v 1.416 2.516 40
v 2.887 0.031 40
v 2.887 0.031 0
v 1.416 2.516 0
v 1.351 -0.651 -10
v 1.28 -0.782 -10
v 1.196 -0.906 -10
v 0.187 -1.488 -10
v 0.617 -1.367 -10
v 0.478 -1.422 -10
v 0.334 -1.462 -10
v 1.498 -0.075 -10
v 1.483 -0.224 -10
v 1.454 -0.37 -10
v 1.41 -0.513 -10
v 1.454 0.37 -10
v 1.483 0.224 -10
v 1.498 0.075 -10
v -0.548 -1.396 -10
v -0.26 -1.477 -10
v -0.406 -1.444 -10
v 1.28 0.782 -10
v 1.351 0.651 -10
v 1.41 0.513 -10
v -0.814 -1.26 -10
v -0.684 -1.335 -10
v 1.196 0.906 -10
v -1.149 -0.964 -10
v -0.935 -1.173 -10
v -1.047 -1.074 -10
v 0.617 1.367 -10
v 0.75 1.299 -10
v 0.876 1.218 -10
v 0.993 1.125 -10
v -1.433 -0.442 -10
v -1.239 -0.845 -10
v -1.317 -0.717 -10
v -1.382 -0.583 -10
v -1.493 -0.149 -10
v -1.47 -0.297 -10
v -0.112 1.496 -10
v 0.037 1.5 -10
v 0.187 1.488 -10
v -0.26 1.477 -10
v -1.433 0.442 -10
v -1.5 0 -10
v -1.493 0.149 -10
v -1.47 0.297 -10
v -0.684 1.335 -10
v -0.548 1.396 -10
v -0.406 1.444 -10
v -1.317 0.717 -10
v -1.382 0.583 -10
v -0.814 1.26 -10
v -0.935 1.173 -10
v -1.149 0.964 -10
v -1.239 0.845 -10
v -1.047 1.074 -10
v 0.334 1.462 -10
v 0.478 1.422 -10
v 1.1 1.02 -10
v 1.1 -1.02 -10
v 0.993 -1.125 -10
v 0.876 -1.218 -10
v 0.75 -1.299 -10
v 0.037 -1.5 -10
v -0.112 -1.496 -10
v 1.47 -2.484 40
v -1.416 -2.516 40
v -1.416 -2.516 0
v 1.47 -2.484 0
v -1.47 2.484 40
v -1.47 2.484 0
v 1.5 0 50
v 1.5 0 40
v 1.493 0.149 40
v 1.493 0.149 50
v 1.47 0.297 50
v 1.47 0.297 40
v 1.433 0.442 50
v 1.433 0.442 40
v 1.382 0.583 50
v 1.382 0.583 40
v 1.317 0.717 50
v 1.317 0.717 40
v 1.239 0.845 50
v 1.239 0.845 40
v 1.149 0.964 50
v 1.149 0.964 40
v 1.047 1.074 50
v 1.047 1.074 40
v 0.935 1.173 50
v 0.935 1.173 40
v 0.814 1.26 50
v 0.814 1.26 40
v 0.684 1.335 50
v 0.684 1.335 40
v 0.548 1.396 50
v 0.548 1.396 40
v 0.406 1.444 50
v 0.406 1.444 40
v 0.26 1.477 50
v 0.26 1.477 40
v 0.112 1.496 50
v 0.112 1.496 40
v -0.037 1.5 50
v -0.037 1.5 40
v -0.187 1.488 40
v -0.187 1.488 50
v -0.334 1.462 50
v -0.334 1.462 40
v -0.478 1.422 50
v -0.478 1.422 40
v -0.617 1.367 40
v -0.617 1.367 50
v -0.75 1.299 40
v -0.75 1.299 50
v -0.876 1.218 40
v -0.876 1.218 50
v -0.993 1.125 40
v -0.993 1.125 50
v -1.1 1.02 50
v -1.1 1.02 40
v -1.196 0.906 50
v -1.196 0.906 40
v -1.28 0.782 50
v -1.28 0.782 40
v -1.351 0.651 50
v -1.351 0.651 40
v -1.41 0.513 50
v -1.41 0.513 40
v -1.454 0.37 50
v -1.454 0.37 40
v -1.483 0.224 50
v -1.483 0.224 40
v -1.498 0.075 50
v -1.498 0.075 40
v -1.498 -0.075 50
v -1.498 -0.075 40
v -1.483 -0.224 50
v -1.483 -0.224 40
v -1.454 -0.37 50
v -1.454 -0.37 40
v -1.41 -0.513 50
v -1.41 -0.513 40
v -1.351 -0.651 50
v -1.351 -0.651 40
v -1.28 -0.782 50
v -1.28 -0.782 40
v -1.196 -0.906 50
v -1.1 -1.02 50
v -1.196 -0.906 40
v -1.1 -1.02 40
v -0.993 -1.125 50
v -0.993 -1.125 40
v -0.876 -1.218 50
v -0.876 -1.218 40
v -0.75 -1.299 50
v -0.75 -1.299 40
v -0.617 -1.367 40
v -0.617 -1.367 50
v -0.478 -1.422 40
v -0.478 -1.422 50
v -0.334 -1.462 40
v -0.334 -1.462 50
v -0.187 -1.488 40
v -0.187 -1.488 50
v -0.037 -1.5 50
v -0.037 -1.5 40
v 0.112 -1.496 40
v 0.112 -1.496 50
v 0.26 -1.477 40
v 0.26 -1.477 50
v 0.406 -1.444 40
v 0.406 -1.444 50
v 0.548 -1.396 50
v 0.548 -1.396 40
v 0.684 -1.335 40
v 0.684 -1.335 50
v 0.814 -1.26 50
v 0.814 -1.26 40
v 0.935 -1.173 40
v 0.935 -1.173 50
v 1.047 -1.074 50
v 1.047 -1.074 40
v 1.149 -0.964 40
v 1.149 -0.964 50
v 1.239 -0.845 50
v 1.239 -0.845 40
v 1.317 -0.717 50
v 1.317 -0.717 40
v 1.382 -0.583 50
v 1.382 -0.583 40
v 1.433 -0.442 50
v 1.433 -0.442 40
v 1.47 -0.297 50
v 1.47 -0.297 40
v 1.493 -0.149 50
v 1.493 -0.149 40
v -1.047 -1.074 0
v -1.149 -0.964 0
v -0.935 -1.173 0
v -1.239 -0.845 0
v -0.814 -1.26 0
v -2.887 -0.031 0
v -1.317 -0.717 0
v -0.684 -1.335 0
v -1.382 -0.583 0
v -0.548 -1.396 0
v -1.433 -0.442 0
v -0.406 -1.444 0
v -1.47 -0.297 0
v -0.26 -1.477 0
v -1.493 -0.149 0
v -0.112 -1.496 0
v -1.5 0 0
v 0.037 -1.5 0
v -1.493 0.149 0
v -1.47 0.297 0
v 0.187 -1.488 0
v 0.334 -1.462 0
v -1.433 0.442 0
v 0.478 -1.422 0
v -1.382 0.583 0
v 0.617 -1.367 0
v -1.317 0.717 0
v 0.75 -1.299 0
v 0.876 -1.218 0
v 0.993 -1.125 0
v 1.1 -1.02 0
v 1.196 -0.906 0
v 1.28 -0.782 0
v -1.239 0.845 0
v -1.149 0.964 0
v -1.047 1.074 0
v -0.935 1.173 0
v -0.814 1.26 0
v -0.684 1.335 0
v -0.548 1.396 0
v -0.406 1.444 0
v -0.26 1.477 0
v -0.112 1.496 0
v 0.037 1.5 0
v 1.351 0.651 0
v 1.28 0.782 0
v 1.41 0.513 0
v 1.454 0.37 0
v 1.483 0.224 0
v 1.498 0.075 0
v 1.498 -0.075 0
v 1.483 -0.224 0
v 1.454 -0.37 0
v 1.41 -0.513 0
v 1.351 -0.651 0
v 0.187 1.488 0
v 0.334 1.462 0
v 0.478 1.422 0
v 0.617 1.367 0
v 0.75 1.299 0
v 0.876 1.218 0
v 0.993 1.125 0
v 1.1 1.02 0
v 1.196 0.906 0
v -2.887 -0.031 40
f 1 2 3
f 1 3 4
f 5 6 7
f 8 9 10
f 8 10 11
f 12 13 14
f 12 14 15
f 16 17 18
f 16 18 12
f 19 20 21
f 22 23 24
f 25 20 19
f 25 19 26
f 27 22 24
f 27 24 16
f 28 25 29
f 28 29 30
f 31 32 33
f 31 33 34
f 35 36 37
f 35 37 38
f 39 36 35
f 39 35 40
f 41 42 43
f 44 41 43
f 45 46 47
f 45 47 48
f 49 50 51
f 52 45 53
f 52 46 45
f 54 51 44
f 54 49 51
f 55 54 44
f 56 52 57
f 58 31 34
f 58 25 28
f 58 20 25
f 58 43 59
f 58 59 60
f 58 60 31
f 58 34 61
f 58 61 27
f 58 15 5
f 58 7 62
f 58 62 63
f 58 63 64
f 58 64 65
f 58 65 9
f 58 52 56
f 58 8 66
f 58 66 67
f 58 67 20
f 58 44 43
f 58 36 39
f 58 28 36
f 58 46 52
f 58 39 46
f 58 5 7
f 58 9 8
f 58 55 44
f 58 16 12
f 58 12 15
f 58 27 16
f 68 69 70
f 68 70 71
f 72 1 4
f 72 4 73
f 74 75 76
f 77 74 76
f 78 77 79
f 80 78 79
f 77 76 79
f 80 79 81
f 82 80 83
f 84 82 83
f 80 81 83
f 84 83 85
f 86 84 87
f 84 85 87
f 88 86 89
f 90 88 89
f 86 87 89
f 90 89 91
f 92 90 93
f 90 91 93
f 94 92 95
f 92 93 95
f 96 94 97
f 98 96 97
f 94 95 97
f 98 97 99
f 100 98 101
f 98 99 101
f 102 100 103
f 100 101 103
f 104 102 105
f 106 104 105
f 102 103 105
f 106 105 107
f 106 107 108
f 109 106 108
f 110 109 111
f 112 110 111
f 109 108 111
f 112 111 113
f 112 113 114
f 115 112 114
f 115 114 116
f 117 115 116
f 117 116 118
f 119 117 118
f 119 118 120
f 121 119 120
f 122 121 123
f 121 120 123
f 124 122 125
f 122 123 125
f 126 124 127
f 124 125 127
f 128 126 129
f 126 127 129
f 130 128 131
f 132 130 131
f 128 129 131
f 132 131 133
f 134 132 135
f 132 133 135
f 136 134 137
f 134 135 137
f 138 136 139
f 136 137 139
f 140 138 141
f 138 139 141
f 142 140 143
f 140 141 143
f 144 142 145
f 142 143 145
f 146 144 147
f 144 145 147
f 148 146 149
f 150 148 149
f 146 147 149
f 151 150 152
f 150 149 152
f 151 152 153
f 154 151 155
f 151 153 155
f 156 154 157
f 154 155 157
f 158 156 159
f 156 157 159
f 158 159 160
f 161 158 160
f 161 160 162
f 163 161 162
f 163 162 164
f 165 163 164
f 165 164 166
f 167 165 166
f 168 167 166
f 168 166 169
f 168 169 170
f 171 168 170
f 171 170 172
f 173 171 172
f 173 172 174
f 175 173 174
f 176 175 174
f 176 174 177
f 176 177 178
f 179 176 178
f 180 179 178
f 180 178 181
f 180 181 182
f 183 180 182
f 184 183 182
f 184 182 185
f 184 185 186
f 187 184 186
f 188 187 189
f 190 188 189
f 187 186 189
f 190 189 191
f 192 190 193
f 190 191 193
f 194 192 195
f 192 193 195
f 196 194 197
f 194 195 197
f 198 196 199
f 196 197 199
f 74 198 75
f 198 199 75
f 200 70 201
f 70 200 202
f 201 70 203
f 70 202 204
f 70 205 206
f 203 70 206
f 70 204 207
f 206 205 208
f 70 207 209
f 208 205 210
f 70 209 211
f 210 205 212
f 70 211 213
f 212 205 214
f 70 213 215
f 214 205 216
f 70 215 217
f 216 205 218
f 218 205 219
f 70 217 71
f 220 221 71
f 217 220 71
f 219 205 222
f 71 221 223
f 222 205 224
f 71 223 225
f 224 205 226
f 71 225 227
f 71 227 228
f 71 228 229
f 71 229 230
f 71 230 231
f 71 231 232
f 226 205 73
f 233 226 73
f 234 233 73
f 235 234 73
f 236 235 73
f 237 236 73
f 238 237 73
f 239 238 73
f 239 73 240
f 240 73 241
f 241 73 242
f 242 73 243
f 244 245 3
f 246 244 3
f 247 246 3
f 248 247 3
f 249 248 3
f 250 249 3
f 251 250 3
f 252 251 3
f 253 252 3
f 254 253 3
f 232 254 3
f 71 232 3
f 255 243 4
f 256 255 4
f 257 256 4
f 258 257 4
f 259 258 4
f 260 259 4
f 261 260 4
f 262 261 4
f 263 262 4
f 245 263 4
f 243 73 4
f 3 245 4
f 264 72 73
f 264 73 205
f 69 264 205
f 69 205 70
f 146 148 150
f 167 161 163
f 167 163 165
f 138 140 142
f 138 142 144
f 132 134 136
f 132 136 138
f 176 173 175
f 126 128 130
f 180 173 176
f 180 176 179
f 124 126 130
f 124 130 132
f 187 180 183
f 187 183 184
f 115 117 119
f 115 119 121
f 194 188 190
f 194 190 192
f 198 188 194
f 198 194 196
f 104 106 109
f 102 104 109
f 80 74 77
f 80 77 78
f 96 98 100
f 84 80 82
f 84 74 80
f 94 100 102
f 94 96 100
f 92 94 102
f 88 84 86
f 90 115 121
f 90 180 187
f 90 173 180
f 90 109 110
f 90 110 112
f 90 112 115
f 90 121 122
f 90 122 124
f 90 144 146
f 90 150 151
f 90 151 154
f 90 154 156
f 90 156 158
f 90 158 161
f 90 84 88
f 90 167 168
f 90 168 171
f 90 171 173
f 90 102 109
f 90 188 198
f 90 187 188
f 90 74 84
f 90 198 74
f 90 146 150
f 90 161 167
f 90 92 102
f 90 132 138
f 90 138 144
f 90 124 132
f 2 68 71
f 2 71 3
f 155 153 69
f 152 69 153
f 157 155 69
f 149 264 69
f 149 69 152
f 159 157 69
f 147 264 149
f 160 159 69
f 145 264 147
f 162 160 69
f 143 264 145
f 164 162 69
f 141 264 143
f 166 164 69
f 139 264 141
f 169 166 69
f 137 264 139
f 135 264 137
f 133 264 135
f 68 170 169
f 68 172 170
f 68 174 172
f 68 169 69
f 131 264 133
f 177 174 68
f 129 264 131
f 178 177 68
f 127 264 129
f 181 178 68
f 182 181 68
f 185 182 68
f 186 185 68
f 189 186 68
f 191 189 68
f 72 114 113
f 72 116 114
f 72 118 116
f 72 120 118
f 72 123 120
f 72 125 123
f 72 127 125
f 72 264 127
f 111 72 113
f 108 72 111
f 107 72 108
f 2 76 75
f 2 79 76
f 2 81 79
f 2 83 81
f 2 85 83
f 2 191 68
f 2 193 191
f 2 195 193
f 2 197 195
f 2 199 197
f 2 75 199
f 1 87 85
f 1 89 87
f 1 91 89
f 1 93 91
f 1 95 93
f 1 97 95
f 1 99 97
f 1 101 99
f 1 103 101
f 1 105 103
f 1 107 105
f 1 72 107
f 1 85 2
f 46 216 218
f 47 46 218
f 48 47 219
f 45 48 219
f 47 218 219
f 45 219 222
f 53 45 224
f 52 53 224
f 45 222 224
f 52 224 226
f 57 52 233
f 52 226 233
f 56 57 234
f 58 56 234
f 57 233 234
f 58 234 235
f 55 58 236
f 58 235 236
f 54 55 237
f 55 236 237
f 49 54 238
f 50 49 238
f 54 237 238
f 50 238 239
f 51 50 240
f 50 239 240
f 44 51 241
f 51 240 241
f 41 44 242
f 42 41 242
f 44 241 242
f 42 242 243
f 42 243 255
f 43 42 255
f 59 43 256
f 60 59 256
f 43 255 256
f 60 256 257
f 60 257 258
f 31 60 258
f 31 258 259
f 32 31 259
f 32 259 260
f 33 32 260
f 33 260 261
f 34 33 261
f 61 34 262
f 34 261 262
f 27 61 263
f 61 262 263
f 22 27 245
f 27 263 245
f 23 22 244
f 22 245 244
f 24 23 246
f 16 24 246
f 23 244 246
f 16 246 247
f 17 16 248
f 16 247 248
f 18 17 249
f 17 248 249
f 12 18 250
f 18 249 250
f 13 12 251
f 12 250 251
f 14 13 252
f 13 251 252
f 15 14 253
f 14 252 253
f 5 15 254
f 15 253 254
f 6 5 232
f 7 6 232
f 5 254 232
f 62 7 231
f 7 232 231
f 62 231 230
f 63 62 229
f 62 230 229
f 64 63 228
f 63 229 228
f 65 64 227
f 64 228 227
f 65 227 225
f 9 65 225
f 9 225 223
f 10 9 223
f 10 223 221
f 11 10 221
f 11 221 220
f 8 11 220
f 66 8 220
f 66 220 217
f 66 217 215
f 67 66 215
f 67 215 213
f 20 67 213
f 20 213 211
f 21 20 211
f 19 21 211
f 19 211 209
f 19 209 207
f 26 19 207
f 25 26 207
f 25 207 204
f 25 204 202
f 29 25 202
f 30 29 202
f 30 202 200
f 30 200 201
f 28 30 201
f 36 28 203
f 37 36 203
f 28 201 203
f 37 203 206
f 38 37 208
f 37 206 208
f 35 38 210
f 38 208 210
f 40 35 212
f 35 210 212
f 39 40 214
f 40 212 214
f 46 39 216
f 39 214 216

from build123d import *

# Parameters (mm, degrees)
BOSS_EXTRU_1_DEPTH = 40
ESQUISSE2_R        = 1.5
BOSS_EXTRU_2_DEPTH = 10
ESQUISSE3_R        = 1.5
BOSS_EXTRU_3_DEPTH = 10


with BuildPart() as part:
    # Esquisse1 → Boss.-Extru.1 (new body)
    with BuildSketch(Plane.XY):
        Polygon((1.470451141, -2.484171245), (2.886580976, 0.03136242), (1.416129835, 2.515533666), (-1.470451141, 2.484171245), (-2.886580976, -0.03136242), (-1.416129835, -2.515533666), align=None)
    extrude(amount=BOSS_EXTRU_1_DEPTH)

    # Esquisse2 → Boss.-Extru.2 (add)
    with BuildSketch(Plane.XY.offset(40)):
        Circle(ESQUISSE2_R)
    extrude(amount=BOSS_EXTRU_2_DEPTH)

    # Esquisse3 → Boss.-Extru.3 (add)
    with BuildSketch(Plane(origin=(0, 0, 0), x_dir=(-1, 0, 0), z_dir=(0, 0, -1))):
        Circle(ESQUISSE3_R)
    extrude(amount=BOSS_EXTRU_3_DEPTH)


solid = part.part
